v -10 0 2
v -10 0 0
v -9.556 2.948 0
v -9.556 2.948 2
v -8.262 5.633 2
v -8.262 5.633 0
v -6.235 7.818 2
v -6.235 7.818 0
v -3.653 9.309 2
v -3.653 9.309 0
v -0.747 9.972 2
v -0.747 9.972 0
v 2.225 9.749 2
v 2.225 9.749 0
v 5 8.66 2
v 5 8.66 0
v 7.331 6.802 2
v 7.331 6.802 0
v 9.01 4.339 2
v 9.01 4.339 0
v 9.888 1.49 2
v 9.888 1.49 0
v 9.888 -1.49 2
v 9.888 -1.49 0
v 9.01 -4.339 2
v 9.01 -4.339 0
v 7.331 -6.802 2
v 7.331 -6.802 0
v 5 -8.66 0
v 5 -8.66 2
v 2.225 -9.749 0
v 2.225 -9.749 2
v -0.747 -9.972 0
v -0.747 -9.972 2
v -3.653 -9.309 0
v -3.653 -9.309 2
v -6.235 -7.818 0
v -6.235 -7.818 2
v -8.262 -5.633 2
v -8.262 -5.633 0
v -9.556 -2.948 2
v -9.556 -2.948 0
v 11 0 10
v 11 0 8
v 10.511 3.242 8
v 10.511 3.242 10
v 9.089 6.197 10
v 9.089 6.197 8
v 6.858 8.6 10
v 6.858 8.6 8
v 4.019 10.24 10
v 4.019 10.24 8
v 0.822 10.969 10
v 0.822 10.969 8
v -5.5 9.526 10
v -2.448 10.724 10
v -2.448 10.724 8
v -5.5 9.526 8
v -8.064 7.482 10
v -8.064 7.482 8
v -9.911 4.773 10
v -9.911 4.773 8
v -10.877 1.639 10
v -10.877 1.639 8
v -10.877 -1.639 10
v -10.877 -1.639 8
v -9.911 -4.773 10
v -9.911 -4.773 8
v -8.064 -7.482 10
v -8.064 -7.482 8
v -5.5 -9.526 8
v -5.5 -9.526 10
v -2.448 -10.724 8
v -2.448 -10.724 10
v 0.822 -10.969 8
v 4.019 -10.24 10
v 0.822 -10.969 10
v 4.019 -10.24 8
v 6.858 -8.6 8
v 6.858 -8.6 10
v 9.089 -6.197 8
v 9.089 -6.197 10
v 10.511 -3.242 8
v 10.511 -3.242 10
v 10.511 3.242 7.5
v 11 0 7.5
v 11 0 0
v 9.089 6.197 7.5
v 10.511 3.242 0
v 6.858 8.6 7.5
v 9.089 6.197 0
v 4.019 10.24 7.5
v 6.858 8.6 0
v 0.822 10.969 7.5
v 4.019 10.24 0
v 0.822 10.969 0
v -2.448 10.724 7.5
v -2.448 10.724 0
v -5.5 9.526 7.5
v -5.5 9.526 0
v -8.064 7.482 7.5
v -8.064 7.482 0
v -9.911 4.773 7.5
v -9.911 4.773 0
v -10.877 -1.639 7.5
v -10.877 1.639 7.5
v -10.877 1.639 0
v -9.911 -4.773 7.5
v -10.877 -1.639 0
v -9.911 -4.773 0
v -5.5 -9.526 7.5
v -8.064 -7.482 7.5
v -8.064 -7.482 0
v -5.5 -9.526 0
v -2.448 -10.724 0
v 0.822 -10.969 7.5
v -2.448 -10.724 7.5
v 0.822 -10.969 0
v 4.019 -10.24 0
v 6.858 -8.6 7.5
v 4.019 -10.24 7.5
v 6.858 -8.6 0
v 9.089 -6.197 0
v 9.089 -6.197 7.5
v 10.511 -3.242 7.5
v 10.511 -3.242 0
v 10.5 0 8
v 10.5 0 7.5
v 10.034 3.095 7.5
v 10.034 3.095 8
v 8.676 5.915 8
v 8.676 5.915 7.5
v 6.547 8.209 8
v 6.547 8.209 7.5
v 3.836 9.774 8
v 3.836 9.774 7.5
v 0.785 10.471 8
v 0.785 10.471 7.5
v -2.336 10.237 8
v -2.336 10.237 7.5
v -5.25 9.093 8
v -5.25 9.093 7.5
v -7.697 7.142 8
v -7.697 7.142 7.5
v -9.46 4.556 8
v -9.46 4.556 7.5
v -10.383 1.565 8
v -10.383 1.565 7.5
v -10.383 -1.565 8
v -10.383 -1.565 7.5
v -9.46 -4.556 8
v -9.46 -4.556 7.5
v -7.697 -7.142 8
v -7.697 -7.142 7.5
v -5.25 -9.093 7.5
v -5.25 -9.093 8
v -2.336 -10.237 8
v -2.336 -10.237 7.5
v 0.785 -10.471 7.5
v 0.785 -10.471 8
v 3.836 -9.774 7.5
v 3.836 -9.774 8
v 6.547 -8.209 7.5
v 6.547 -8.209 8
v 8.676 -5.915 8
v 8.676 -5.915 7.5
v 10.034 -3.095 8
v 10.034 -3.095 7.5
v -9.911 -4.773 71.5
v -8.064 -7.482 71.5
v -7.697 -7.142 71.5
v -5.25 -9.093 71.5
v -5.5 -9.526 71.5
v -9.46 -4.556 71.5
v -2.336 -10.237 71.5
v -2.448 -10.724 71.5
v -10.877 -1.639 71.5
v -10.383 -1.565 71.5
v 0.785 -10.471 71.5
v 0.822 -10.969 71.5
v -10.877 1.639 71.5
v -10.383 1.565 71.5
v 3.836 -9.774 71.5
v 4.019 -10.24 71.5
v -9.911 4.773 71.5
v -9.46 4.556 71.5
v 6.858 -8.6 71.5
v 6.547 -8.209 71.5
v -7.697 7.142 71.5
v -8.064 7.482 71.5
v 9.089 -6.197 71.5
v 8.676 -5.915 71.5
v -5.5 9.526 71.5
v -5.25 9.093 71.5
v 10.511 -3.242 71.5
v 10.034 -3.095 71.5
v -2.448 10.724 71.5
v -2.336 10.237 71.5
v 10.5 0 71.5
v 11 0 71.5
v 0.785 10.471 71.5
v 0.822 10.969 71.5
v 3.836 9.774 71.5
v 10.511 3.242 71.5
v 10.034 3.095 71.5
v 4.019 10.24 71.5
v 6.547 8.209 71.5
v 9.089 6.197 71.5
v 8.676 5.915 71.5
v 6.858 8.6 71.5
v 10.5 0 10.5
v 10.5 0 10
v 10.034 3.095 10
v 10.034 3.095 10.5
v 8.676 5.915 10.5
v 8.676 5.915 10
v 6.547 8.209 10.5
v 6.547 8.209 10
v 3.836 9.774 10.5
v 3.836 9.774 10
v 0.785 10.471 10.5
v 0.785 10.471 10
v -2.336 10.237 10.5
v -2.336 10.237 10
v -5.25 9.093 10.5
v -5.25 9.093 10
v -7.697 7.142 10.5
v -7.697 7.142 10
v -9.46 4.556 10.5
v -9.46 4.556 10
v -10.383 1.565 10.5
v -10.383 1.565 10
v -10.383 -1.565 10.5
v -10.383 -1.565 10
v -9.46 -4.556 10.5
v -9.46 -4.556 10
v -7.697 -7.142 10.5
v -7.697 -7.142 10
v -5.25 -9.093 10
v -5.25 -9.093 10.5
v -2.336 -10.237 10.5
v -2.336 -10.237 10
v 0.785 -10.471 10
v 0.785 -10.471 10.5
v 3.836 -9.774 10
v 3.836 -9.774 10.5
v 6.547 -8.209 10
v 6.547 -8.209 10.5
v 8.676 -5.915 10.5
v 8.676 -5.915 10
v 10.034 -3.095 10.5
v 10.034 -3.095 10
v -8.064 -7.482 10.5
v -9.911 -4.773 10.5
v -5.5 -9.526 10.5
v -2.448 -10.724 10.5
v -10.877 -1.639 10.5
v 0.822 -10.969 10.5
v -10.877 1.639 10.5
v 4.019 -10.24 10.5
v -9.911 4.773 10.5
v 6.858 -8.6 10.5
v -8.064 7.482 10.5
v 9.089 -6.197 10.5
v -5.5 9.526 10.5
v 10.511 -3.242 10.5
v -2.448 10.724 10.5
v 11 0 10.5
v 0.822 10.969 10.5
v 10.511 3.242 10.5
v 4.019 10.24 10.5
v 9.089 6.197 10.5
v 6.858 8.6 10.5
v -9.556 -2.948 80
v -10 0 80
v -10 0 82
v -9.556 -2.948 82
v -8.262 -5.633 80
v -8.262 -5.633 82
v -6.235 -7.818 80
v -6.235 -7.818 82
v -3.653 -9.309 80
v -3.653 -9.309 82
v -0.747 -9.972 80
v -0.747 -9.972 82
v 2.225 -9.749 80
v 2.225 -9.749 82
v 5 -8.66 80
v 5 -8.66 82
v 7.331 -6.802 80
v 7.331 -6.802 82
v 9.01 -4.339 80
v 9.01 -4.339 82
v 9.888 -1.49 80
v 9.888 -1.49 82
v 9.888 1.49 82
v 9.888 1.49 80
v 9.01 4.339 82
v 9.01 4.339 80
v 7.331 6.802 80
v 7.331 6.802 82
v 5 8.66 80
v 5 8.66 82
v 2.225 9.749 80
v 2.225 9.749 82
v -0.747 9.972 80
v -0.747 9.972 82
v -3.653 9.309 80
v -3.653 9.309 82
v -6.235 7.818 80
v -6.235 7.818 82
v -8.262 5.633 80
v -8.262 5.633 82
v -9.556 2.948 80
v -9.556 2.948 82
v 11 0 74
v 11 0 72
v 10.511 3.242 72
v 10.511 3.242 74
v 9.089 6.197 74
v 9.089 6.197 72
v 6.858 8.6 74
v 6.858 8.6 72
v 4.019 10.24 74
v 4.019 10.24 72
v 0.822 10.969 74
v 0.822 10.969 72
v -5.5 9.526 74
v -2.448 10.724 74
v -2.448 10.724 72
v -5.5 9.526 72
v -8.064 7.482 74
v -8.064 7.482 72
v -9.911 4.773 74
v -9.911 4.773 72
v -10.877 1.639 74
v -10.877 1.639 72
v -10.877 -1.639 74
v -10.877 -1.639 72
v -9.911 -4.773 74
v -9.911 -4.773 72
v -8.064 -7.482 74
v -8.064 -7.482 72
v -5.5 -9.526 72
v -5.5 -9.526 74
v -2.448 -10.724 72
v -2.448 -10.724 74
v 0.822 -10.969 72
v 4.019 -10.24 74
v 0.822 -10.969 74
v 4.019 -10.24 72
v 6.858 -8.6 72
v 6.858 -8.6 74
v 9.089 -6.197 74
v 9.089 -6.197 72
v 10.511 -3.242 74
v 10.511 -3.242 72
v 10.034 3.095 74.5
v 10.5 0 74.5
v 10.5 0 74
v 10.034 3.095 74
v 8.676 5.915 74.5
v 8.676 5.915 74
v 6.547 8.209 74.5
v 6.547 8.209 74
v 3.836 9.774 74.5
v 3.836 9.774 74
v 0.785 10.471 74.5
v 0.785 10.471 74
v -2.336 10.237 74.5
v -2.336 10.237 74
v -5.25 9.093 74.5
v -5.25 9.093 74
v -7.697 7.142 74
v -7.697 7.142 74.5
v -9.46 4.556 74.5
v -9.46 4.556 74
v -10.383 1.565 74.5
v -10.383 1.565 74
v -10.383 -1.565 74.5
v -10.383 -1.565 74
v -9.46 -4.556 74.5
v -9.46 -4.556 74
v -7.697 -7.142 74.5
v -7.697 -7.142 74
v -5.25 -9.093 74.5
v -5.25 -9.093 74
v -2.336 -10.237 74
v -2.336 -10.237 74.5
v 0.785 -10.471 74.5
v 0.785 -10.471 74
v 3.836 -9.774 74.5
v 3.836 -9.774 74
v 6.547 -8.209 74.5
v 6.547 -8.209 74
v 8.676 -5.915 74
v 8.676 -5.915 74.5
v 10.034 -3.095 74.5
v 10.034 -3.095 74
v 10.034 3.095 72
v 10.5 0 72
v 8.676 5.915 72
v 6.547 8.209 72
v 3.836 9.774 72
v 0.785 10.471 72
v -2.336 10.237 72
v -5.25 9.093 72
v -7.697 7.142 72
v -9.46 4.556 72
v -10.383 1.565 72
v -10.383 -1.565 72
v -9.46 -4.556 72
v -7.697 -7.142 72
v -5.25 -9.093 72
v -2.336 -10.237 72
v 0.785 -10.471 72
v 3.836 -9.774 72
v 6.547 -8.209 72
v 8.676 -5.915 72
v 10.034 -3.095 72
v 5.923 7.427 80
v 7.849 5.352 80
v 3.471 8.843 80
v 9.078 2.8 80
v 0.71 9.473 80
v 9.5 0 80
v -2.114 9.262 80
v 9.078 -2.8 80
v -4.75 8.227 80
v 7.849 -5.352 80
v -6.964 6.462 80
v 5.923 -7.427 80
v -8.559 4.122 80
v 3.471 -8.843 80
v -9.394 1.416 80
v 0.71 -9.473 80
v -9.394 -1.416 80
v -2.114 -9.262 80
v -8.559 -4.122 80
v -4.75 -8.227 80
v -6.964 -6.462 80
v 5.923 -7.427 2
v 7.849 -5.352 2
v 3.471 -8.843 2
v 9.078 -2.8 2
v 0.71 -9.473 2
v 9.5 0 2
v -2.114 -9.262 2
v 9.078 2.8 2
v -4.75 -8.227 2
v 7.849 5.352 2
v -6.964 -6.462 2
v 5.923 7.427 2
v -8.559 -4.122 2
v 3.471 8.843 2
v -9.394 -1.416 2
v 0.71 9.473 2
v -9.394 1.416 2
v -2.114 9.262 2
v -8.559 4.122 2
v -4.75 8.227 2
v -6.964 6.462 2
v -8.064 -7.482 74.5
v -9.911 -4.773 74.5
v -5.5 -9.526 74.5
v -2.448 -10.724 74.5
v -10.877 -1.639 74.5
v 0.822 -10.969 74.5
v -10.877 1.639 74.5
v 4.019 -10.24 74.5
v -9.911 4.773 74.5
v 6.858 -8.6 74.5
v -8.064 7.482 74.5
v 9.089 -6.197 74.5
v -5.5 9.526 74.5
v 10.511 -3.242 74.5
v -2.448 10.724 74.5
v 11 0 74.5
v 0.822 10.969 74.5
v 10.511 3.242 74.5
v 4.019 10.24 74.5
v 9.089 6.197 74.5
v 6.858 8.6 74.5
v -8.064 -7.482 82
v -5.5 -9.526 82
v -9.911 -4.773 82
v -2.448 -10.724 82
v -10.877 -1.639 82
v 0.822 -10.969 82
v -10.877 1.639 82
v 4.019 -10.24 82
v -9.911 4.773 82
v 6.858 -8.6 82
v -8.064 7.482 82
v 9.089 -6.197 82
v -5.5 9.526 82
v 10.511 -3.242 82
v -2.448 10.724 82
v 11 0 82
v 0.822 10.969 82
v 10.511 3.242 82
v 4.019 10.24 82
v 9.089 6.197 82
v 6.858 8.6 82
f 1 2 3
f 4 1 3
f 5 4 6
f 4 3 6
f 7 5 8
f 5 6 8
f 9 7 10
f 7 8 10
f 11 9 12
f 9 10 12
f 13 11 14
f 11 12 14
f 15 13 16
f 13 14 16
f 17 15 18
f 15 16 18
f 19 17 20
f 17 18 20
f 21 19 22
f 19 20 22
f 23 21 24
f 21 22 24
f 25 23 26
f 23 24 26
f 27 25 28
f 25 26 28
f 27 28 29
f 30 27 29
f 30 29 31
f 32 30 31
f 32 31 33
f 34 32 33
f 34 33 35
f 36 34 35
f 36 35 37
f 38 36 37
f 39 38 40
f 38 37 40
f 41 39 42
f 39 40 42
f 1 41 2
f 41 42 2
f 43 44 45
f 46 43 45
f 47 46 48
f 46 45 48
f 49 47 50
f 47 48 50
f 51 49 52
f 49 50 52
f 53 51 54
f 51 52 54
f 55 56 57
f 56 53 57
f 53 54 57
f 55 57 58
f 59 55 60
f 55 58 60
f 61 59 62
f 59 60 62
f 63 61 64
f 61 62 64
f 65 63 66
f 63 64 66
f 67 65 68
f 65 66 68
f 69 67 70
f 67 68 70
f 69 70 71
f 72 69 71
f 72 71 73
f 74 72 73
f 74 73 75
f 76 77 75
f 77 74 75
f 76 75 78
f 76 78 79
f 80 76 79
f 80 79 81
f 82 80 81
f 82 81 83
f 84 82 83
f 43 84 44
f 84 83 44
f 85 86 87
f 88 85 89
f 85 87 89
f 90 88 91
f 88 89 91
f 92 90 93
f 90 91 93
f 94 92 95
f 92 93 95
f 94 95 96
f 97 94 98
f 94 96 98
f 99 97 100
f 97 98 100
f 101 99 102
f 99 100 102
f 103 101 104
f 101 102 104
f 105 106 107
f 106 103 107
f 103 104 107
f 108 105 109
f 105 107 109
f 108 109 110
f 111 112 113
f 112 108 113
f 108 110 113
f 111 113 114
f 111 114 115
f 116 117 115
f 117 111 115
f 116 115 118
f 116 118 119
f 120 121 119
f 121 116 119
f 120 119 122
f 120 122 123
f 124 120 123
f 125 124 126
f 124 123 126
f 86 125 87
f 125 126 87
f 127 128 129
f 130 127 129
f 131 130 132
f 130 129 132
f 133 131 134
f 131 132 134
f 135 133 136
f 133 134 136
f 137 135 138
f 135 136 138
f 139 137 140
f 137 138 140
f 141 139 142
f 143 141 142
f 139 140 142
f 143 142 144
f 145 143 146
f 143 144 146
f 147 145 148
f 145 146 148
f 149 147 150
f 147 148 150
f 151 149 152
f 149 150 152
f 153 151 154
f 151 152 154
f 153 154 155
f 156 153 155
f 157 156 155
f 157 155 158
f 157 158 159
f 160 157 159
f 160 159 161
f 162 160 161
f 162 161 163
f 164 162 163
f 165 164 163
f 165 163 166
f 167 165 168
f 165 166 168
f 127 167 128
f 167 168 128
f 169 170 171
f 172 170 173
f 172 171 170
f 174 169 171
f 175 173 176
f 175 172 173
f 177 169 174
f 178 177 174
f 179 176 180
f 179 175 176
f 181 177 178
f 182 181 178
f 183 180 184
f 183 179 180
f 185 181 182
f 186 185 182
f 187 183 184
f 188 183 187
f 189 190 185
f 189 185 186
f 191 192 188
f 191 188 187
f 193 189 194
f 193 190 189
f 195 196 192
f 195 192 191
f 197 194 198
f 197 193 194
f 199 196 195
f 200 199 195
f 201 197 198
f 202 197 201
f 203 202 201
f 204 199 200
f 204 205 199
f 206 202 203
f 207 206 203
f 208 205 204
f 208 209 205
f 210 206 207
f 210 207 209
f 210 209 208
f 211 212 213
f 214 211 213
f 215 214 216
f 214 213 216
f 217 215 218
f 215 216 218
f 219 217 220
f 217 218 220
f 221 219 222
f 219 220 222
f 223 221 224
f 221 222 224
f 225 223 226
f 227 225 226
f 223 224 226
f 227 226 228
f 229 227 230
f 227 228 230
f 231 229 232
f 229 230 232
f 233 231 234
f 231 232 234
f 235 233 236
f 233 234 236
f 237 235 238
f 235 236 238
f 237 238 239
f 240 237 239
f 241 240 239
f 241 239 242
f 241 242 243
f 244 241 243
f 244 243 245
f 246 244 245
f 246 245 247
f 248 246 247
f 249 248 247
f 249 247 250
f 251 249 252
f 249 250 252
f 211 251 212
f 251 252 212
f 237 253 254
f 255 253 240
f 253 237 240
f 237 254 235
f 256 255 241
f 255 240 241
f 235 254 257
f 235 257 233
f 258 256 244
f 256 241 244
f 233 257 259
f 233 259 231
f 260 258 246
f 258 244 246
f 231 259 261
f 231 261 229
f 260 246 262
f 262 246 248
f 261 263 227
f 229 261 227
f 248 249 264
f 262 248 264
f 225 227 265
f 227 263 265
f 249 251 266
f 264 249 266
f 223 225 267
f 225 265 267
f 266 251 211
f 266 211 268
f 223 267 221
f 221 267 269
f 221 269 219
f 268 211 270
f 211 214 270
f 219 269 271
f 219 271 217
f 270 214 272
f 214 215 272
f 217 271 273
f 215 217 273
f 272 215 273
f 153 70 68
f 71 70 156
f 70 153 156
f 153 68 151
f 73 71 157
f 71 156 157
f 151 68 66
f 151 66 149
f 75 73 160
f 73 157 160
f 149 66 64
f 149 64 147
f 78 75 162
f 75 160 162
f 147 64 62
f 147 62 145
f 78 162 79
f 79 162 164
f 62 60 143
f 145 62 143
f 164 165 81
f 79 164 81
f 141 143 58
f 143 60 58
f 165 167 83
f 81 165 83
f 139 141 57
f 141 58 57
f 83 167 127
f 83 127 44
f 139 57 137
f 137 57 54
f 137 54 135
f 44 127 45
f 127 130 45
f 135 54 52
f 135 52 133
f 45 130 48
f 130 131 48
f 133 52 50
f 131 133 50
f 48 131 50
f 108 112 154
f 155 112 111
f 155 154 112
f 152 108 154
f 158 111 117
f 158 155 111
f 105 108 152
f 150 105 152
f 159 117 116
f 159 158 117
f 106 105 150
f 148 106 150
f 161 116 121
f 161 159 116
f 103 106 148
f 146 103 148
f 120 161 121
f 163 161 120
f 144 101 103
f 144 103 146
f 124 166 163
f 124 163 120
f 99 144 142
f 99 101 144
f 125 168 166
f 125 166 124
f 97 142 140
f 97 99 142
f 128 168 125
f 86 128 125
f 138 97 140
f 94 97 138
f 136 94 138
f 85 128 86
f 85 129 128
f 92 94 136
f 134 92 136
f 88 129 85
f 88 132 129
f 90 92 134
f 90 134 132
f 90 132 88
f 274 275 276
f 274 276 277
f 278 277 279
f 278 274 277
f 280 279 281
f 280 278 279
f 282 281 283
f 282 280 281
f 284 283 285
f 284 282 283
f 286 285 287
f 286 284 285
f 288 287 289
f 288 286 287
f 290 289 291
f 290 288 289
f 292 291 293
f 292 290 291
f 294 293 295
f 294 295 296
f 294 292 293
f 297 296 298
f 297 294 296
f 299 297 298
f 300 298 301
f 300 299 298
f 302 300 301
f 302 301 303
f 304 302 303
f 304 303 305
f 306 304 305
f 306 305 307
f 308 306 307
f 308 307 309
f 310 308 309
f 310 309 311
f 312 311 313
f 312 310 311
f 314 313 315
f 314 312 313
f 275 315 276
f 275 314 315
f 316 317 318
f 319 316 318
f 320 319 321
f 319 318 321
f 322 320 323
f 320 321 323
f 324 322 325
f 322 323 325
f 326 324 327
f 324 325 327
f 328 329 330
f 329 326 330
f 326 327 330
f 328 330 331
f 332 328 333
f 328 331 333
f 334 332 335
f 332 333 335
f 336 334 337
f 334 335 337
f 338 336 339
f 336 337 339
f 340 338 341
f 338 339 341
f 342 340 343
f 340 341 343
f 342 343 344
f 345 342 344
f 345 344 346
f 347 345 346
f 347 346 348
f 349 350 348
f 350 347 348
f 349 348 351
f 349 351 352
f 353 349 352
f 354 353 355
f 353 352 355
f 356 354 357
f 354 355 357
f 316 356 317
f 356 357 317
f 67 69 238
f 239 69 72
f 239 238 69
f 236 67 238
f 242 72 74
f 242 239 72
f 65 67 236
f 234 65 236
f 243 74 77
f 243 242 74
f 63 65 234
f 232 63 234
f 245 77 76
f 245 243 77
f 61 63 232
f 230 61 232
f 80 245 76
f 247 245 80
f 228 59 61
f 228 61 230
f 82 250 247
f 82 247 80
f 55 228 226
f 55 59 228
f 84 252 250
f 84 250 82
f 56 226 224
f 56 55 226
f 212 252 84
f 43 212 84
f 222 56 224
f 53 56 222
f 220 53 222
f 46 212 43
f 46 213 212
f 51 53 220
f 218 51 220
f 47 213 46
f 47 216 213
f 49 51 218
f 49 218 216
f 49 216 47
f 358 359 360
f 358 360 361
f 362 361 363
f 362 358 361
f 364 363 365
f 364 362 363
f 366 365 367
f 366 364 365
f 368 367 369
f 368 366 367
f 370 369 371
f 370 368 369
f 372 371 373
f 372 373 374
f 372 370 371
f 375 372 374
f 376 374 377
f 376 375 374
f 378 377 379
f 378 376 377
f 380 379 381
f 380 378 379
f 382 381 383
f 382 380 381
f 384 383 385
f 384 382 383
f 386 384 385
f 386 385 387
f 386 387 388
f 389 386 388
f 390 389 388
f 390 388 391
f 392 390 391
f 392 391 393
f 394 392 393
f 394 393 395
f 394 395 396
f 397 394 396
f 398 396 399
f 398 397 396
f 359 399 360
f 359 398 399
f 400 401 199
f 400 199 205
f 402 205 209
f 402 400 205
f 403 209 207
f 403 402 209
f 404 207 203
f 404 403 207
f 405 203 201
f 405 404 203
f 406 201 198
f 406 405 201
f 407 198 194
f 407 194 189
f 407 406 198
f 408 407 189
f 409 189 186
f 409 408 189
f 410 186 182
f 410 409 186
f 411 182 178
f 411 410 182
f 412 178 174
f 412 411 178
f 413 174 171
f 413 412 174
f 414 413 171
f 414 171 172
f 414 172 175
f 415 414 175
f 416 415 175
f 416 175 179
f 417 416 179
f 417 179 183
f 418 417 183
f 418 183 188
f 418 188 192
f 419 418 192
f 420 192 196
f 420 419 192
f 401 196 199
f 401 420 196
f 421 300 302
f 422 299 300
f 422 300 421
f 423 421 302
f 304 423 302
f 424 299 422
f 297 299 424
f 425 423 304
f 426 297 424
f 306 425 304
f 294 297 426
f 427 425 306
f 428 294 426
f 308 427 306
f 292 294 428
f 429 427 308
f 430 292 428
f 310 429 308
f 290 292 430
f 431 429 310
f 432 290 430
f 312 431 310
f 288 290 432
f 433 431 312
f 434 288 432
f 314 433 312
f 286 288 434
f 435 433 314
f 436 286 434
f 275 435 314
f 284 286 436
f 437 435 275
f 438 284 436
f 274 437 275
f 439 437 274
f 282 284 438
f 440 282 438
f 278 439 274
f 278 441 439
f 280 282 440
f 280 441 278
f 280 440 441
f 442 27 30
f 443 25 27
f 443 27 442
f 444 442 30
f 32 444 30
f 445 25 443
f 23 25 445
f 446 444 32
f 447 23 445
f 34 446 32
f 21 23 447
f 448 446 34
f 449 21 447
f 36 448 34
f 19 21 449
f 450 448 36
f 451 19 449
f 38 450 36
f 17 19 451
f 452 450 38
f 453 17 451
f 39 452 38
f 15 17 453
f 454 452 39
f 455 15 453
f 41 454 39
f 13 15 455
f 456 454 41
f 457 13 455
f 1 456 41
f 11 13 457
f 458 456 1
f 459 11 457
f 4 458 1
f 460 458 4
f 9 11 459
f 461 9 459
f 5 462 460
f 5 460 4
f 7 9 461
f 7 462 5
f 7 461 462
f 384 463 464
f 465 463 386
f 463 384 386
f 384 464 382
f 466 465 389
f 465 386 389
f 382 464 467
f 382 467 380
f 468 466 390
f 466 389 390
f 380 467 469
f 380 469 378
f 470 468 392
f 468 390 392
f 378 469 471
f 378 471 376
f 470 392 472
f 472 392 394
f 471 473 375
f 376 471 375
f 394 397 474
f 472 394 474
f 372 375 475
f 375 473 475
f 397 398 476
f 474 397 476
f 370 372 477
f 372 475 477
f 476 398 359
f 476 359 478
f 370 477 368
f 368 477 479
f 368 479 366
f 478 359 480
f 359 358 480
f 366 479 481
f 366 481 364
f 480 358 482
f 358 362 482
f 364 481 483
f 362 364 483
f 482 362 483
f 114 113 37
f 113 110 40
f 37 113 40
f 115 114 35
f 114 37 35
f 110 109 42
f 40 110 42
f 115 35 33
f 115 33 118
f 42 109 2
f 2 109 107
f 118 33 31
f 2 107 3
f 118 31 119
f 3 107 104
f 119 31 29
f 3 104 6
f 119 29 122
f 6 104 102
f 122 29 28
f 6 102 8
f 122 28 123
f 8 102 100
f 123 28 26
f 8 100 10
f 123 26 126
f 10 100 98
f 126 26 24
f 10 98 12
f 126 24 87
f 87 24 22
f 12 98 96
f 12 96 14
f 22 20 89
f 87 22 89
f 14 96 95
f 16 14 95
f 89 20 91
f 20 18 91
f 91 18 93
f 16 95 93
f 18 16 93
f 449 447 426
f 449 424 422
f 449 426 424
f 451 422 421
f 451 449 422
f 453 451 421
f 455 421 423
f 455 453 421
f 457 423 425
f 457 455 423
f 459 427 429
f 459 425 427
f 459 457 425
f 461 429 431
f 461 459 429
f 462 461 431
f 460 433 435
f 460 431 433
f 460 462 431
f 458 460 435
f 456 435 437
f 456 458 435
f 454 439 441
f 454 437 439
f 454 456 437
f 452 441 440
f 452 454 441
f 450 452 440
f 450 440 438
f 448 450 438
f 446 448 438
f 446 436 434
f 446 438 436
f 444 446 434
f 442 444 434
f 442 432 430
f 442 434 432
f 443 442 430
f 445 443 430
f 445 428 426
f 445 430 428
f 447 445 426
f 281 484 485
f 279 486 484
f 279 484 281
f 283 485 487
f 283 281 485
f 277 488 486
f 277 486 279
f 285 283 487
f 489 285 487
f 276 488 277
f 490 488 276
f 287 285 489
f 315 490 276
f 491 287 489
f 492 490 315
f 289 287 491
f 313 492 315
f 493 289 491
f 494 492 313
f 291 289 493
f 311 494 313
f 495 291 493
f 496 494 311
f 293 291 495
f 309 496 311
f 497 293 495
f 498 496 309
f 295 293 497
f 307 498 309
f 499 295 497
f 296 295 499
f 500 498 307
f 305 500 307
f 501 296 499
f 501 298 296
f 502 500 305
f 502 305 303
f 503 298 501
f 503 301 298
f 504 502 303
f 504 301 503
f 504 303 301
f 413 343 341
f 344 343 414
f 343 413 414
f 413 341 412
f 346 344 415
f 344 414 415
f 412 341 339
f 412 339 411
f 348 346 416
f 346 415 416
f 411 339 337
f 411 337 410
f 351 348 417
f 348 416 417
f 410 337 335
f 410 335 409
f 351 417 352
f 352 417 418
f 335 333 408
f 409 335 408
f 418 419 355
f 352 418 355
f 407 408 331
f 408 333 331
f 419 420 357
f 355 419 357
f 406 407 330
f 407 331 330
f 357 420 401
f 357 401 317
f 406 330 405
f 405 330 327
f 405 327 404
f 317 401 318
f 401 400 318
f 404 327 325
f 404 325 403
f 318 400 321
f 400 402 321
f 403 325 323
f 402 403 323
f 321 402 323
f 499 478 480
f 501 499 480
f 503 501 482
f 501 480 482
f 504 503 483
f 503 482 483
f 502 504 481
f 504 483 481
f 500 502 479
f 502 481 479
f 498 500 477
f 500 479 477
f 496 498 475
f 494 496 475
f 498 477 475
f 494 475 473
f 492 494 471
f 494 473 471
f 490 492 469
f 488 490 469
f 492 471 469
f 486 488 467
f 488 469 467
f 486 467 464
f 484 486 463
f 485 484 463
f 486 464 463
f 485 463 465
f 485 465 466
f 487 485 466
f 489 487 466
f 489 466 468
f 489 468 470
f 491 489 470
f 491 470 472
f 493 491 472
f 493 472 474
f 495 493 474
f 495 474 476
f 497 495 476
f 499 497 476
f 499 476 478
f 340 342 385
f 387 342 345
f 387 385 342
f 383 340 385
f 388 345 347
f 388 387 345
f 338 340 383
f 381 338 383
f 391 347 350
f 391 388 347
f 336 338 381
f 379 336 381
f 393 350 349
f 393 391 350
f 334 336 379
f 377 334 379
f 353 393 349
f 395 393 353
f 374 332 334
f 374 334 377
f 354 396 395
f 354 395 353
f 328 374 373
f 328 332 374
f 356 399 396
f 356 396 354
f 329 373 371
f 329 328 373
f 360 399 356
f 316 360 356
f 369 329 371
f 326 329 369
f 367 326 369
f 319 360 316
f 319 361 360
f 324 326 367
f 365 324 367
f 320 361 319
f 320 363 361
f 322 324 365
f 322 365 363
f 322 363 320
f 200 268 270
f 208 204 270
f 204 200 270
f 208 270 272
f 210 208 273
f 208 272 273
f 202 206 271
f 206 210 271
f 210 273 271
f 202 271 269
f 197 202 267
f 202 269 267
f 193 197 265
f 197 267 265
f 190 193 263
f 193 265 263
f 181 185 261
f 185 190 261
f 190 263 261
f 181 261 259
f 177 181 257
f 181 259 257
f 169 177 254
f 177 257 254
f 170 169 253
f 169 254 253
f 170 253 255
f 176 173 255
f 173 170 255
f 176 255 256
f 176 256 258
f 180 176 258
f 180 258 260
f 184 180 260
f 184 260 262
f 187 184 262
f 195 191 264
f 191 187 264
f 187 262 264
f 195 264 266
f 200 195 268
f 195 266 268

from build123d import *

# Parameters (mm, degrees)
SKETCH_1_R          = 11
SKETCH_1_R_2        = 9.5
EXTRUDE_1_DEPTH     = 82
SKETCH_4_R          = 10
CUT_EXTRUDE_2_DEPTH = 2
CUT_EXTRUDE_START   = -2
SKETCH_5_R          = 10
CUT_EXTRUDE_3_DEPTH = 2
SKETCH_6_R          = 11.5
SKETCH_6_R_2        = 10.5
CUT_EXTRUDE_4_DEPTH = 0.5
SKETCH_7_R          = 11.5
SKETCH_7_R_2        = 10.5
CUT_EXTRUDE_5_DEPTH = 0.5


with BuildPart() as part:
    # Эскиз1 → Бобышка-Вытянуть1 (new body)
    with BuildSketch(Plane.XY):
        Circle(SKETCH_1_R)
        Circle(SKETCH_1_R_2, mode=Mode.SUBTRACT)
    extrude(amount=EXTRUDE_1_DEPTH)

    # Эскиз4 → Вырез-Вытянуть2 (cut)
    with BuildSketch(Plane(origin=(0, 0, 0), x_dir=(-1, 0, 0), z_dir=(0, 0, -1))):
        Circle(SKETCH_4_R)
    extrude(amount=-CUT_EXTRUDE_2_DEPTH, mode=Mode.SUBTRACT)

    # Эскиз5 → Вырез-Вытянуть3 (cut)
    with BuildSketch(Plane.XY.offset(82).offset(CUT_EXTRUDE_START)):
        with Locations(Location((0, 0, 0), (0, 0, 180))):
            Circle(SKETCH_5_R)
    extrude(amount=CUT_EXTRUDE_3_DEPTH, mode=Mode.SUBTRACT)

    # Эскиз6 → Вырез-Вытянуть4 (cut)
    with BuildSketch(Plane.XY.offset(74.5)):
        Circle(SKETCH_6_R)
        Circle(SKETCH_6_R_2, mode=Mode.SUBTRACT)
    cut_extrude_4 = extrude(amount=-CUT_EXTRUDE_4_DEPTH, mode=Mode.SUBTRACT)

    # Эскиз7 → Вырез-Вытянуть5 (cut)
    with BuildSketch(Plane.XY.offset(72)):
        Circle(SKETCH_7_R)
        Circle(SKETCH_7_R_2, mode=Mode.SUBTRACT)
    cut_extrude_5 = extrude(amount=-CUT_EXTRUDE_5_DEPTH, mode=Mode.SUBTRACT)

    # Зеркальное отражение1: Вырез-Вытянуть4, Вырез-Вытянуть5 across plane
    add(cut_extrude_4.mirror(Plane.XY.offset(41)), mode=Mode.SUBTRACT)
    add(cut_extrude_5.mirror(Plane.XY.offset(41)), mode=Mode.SUBTRACT)


solid = part.part
